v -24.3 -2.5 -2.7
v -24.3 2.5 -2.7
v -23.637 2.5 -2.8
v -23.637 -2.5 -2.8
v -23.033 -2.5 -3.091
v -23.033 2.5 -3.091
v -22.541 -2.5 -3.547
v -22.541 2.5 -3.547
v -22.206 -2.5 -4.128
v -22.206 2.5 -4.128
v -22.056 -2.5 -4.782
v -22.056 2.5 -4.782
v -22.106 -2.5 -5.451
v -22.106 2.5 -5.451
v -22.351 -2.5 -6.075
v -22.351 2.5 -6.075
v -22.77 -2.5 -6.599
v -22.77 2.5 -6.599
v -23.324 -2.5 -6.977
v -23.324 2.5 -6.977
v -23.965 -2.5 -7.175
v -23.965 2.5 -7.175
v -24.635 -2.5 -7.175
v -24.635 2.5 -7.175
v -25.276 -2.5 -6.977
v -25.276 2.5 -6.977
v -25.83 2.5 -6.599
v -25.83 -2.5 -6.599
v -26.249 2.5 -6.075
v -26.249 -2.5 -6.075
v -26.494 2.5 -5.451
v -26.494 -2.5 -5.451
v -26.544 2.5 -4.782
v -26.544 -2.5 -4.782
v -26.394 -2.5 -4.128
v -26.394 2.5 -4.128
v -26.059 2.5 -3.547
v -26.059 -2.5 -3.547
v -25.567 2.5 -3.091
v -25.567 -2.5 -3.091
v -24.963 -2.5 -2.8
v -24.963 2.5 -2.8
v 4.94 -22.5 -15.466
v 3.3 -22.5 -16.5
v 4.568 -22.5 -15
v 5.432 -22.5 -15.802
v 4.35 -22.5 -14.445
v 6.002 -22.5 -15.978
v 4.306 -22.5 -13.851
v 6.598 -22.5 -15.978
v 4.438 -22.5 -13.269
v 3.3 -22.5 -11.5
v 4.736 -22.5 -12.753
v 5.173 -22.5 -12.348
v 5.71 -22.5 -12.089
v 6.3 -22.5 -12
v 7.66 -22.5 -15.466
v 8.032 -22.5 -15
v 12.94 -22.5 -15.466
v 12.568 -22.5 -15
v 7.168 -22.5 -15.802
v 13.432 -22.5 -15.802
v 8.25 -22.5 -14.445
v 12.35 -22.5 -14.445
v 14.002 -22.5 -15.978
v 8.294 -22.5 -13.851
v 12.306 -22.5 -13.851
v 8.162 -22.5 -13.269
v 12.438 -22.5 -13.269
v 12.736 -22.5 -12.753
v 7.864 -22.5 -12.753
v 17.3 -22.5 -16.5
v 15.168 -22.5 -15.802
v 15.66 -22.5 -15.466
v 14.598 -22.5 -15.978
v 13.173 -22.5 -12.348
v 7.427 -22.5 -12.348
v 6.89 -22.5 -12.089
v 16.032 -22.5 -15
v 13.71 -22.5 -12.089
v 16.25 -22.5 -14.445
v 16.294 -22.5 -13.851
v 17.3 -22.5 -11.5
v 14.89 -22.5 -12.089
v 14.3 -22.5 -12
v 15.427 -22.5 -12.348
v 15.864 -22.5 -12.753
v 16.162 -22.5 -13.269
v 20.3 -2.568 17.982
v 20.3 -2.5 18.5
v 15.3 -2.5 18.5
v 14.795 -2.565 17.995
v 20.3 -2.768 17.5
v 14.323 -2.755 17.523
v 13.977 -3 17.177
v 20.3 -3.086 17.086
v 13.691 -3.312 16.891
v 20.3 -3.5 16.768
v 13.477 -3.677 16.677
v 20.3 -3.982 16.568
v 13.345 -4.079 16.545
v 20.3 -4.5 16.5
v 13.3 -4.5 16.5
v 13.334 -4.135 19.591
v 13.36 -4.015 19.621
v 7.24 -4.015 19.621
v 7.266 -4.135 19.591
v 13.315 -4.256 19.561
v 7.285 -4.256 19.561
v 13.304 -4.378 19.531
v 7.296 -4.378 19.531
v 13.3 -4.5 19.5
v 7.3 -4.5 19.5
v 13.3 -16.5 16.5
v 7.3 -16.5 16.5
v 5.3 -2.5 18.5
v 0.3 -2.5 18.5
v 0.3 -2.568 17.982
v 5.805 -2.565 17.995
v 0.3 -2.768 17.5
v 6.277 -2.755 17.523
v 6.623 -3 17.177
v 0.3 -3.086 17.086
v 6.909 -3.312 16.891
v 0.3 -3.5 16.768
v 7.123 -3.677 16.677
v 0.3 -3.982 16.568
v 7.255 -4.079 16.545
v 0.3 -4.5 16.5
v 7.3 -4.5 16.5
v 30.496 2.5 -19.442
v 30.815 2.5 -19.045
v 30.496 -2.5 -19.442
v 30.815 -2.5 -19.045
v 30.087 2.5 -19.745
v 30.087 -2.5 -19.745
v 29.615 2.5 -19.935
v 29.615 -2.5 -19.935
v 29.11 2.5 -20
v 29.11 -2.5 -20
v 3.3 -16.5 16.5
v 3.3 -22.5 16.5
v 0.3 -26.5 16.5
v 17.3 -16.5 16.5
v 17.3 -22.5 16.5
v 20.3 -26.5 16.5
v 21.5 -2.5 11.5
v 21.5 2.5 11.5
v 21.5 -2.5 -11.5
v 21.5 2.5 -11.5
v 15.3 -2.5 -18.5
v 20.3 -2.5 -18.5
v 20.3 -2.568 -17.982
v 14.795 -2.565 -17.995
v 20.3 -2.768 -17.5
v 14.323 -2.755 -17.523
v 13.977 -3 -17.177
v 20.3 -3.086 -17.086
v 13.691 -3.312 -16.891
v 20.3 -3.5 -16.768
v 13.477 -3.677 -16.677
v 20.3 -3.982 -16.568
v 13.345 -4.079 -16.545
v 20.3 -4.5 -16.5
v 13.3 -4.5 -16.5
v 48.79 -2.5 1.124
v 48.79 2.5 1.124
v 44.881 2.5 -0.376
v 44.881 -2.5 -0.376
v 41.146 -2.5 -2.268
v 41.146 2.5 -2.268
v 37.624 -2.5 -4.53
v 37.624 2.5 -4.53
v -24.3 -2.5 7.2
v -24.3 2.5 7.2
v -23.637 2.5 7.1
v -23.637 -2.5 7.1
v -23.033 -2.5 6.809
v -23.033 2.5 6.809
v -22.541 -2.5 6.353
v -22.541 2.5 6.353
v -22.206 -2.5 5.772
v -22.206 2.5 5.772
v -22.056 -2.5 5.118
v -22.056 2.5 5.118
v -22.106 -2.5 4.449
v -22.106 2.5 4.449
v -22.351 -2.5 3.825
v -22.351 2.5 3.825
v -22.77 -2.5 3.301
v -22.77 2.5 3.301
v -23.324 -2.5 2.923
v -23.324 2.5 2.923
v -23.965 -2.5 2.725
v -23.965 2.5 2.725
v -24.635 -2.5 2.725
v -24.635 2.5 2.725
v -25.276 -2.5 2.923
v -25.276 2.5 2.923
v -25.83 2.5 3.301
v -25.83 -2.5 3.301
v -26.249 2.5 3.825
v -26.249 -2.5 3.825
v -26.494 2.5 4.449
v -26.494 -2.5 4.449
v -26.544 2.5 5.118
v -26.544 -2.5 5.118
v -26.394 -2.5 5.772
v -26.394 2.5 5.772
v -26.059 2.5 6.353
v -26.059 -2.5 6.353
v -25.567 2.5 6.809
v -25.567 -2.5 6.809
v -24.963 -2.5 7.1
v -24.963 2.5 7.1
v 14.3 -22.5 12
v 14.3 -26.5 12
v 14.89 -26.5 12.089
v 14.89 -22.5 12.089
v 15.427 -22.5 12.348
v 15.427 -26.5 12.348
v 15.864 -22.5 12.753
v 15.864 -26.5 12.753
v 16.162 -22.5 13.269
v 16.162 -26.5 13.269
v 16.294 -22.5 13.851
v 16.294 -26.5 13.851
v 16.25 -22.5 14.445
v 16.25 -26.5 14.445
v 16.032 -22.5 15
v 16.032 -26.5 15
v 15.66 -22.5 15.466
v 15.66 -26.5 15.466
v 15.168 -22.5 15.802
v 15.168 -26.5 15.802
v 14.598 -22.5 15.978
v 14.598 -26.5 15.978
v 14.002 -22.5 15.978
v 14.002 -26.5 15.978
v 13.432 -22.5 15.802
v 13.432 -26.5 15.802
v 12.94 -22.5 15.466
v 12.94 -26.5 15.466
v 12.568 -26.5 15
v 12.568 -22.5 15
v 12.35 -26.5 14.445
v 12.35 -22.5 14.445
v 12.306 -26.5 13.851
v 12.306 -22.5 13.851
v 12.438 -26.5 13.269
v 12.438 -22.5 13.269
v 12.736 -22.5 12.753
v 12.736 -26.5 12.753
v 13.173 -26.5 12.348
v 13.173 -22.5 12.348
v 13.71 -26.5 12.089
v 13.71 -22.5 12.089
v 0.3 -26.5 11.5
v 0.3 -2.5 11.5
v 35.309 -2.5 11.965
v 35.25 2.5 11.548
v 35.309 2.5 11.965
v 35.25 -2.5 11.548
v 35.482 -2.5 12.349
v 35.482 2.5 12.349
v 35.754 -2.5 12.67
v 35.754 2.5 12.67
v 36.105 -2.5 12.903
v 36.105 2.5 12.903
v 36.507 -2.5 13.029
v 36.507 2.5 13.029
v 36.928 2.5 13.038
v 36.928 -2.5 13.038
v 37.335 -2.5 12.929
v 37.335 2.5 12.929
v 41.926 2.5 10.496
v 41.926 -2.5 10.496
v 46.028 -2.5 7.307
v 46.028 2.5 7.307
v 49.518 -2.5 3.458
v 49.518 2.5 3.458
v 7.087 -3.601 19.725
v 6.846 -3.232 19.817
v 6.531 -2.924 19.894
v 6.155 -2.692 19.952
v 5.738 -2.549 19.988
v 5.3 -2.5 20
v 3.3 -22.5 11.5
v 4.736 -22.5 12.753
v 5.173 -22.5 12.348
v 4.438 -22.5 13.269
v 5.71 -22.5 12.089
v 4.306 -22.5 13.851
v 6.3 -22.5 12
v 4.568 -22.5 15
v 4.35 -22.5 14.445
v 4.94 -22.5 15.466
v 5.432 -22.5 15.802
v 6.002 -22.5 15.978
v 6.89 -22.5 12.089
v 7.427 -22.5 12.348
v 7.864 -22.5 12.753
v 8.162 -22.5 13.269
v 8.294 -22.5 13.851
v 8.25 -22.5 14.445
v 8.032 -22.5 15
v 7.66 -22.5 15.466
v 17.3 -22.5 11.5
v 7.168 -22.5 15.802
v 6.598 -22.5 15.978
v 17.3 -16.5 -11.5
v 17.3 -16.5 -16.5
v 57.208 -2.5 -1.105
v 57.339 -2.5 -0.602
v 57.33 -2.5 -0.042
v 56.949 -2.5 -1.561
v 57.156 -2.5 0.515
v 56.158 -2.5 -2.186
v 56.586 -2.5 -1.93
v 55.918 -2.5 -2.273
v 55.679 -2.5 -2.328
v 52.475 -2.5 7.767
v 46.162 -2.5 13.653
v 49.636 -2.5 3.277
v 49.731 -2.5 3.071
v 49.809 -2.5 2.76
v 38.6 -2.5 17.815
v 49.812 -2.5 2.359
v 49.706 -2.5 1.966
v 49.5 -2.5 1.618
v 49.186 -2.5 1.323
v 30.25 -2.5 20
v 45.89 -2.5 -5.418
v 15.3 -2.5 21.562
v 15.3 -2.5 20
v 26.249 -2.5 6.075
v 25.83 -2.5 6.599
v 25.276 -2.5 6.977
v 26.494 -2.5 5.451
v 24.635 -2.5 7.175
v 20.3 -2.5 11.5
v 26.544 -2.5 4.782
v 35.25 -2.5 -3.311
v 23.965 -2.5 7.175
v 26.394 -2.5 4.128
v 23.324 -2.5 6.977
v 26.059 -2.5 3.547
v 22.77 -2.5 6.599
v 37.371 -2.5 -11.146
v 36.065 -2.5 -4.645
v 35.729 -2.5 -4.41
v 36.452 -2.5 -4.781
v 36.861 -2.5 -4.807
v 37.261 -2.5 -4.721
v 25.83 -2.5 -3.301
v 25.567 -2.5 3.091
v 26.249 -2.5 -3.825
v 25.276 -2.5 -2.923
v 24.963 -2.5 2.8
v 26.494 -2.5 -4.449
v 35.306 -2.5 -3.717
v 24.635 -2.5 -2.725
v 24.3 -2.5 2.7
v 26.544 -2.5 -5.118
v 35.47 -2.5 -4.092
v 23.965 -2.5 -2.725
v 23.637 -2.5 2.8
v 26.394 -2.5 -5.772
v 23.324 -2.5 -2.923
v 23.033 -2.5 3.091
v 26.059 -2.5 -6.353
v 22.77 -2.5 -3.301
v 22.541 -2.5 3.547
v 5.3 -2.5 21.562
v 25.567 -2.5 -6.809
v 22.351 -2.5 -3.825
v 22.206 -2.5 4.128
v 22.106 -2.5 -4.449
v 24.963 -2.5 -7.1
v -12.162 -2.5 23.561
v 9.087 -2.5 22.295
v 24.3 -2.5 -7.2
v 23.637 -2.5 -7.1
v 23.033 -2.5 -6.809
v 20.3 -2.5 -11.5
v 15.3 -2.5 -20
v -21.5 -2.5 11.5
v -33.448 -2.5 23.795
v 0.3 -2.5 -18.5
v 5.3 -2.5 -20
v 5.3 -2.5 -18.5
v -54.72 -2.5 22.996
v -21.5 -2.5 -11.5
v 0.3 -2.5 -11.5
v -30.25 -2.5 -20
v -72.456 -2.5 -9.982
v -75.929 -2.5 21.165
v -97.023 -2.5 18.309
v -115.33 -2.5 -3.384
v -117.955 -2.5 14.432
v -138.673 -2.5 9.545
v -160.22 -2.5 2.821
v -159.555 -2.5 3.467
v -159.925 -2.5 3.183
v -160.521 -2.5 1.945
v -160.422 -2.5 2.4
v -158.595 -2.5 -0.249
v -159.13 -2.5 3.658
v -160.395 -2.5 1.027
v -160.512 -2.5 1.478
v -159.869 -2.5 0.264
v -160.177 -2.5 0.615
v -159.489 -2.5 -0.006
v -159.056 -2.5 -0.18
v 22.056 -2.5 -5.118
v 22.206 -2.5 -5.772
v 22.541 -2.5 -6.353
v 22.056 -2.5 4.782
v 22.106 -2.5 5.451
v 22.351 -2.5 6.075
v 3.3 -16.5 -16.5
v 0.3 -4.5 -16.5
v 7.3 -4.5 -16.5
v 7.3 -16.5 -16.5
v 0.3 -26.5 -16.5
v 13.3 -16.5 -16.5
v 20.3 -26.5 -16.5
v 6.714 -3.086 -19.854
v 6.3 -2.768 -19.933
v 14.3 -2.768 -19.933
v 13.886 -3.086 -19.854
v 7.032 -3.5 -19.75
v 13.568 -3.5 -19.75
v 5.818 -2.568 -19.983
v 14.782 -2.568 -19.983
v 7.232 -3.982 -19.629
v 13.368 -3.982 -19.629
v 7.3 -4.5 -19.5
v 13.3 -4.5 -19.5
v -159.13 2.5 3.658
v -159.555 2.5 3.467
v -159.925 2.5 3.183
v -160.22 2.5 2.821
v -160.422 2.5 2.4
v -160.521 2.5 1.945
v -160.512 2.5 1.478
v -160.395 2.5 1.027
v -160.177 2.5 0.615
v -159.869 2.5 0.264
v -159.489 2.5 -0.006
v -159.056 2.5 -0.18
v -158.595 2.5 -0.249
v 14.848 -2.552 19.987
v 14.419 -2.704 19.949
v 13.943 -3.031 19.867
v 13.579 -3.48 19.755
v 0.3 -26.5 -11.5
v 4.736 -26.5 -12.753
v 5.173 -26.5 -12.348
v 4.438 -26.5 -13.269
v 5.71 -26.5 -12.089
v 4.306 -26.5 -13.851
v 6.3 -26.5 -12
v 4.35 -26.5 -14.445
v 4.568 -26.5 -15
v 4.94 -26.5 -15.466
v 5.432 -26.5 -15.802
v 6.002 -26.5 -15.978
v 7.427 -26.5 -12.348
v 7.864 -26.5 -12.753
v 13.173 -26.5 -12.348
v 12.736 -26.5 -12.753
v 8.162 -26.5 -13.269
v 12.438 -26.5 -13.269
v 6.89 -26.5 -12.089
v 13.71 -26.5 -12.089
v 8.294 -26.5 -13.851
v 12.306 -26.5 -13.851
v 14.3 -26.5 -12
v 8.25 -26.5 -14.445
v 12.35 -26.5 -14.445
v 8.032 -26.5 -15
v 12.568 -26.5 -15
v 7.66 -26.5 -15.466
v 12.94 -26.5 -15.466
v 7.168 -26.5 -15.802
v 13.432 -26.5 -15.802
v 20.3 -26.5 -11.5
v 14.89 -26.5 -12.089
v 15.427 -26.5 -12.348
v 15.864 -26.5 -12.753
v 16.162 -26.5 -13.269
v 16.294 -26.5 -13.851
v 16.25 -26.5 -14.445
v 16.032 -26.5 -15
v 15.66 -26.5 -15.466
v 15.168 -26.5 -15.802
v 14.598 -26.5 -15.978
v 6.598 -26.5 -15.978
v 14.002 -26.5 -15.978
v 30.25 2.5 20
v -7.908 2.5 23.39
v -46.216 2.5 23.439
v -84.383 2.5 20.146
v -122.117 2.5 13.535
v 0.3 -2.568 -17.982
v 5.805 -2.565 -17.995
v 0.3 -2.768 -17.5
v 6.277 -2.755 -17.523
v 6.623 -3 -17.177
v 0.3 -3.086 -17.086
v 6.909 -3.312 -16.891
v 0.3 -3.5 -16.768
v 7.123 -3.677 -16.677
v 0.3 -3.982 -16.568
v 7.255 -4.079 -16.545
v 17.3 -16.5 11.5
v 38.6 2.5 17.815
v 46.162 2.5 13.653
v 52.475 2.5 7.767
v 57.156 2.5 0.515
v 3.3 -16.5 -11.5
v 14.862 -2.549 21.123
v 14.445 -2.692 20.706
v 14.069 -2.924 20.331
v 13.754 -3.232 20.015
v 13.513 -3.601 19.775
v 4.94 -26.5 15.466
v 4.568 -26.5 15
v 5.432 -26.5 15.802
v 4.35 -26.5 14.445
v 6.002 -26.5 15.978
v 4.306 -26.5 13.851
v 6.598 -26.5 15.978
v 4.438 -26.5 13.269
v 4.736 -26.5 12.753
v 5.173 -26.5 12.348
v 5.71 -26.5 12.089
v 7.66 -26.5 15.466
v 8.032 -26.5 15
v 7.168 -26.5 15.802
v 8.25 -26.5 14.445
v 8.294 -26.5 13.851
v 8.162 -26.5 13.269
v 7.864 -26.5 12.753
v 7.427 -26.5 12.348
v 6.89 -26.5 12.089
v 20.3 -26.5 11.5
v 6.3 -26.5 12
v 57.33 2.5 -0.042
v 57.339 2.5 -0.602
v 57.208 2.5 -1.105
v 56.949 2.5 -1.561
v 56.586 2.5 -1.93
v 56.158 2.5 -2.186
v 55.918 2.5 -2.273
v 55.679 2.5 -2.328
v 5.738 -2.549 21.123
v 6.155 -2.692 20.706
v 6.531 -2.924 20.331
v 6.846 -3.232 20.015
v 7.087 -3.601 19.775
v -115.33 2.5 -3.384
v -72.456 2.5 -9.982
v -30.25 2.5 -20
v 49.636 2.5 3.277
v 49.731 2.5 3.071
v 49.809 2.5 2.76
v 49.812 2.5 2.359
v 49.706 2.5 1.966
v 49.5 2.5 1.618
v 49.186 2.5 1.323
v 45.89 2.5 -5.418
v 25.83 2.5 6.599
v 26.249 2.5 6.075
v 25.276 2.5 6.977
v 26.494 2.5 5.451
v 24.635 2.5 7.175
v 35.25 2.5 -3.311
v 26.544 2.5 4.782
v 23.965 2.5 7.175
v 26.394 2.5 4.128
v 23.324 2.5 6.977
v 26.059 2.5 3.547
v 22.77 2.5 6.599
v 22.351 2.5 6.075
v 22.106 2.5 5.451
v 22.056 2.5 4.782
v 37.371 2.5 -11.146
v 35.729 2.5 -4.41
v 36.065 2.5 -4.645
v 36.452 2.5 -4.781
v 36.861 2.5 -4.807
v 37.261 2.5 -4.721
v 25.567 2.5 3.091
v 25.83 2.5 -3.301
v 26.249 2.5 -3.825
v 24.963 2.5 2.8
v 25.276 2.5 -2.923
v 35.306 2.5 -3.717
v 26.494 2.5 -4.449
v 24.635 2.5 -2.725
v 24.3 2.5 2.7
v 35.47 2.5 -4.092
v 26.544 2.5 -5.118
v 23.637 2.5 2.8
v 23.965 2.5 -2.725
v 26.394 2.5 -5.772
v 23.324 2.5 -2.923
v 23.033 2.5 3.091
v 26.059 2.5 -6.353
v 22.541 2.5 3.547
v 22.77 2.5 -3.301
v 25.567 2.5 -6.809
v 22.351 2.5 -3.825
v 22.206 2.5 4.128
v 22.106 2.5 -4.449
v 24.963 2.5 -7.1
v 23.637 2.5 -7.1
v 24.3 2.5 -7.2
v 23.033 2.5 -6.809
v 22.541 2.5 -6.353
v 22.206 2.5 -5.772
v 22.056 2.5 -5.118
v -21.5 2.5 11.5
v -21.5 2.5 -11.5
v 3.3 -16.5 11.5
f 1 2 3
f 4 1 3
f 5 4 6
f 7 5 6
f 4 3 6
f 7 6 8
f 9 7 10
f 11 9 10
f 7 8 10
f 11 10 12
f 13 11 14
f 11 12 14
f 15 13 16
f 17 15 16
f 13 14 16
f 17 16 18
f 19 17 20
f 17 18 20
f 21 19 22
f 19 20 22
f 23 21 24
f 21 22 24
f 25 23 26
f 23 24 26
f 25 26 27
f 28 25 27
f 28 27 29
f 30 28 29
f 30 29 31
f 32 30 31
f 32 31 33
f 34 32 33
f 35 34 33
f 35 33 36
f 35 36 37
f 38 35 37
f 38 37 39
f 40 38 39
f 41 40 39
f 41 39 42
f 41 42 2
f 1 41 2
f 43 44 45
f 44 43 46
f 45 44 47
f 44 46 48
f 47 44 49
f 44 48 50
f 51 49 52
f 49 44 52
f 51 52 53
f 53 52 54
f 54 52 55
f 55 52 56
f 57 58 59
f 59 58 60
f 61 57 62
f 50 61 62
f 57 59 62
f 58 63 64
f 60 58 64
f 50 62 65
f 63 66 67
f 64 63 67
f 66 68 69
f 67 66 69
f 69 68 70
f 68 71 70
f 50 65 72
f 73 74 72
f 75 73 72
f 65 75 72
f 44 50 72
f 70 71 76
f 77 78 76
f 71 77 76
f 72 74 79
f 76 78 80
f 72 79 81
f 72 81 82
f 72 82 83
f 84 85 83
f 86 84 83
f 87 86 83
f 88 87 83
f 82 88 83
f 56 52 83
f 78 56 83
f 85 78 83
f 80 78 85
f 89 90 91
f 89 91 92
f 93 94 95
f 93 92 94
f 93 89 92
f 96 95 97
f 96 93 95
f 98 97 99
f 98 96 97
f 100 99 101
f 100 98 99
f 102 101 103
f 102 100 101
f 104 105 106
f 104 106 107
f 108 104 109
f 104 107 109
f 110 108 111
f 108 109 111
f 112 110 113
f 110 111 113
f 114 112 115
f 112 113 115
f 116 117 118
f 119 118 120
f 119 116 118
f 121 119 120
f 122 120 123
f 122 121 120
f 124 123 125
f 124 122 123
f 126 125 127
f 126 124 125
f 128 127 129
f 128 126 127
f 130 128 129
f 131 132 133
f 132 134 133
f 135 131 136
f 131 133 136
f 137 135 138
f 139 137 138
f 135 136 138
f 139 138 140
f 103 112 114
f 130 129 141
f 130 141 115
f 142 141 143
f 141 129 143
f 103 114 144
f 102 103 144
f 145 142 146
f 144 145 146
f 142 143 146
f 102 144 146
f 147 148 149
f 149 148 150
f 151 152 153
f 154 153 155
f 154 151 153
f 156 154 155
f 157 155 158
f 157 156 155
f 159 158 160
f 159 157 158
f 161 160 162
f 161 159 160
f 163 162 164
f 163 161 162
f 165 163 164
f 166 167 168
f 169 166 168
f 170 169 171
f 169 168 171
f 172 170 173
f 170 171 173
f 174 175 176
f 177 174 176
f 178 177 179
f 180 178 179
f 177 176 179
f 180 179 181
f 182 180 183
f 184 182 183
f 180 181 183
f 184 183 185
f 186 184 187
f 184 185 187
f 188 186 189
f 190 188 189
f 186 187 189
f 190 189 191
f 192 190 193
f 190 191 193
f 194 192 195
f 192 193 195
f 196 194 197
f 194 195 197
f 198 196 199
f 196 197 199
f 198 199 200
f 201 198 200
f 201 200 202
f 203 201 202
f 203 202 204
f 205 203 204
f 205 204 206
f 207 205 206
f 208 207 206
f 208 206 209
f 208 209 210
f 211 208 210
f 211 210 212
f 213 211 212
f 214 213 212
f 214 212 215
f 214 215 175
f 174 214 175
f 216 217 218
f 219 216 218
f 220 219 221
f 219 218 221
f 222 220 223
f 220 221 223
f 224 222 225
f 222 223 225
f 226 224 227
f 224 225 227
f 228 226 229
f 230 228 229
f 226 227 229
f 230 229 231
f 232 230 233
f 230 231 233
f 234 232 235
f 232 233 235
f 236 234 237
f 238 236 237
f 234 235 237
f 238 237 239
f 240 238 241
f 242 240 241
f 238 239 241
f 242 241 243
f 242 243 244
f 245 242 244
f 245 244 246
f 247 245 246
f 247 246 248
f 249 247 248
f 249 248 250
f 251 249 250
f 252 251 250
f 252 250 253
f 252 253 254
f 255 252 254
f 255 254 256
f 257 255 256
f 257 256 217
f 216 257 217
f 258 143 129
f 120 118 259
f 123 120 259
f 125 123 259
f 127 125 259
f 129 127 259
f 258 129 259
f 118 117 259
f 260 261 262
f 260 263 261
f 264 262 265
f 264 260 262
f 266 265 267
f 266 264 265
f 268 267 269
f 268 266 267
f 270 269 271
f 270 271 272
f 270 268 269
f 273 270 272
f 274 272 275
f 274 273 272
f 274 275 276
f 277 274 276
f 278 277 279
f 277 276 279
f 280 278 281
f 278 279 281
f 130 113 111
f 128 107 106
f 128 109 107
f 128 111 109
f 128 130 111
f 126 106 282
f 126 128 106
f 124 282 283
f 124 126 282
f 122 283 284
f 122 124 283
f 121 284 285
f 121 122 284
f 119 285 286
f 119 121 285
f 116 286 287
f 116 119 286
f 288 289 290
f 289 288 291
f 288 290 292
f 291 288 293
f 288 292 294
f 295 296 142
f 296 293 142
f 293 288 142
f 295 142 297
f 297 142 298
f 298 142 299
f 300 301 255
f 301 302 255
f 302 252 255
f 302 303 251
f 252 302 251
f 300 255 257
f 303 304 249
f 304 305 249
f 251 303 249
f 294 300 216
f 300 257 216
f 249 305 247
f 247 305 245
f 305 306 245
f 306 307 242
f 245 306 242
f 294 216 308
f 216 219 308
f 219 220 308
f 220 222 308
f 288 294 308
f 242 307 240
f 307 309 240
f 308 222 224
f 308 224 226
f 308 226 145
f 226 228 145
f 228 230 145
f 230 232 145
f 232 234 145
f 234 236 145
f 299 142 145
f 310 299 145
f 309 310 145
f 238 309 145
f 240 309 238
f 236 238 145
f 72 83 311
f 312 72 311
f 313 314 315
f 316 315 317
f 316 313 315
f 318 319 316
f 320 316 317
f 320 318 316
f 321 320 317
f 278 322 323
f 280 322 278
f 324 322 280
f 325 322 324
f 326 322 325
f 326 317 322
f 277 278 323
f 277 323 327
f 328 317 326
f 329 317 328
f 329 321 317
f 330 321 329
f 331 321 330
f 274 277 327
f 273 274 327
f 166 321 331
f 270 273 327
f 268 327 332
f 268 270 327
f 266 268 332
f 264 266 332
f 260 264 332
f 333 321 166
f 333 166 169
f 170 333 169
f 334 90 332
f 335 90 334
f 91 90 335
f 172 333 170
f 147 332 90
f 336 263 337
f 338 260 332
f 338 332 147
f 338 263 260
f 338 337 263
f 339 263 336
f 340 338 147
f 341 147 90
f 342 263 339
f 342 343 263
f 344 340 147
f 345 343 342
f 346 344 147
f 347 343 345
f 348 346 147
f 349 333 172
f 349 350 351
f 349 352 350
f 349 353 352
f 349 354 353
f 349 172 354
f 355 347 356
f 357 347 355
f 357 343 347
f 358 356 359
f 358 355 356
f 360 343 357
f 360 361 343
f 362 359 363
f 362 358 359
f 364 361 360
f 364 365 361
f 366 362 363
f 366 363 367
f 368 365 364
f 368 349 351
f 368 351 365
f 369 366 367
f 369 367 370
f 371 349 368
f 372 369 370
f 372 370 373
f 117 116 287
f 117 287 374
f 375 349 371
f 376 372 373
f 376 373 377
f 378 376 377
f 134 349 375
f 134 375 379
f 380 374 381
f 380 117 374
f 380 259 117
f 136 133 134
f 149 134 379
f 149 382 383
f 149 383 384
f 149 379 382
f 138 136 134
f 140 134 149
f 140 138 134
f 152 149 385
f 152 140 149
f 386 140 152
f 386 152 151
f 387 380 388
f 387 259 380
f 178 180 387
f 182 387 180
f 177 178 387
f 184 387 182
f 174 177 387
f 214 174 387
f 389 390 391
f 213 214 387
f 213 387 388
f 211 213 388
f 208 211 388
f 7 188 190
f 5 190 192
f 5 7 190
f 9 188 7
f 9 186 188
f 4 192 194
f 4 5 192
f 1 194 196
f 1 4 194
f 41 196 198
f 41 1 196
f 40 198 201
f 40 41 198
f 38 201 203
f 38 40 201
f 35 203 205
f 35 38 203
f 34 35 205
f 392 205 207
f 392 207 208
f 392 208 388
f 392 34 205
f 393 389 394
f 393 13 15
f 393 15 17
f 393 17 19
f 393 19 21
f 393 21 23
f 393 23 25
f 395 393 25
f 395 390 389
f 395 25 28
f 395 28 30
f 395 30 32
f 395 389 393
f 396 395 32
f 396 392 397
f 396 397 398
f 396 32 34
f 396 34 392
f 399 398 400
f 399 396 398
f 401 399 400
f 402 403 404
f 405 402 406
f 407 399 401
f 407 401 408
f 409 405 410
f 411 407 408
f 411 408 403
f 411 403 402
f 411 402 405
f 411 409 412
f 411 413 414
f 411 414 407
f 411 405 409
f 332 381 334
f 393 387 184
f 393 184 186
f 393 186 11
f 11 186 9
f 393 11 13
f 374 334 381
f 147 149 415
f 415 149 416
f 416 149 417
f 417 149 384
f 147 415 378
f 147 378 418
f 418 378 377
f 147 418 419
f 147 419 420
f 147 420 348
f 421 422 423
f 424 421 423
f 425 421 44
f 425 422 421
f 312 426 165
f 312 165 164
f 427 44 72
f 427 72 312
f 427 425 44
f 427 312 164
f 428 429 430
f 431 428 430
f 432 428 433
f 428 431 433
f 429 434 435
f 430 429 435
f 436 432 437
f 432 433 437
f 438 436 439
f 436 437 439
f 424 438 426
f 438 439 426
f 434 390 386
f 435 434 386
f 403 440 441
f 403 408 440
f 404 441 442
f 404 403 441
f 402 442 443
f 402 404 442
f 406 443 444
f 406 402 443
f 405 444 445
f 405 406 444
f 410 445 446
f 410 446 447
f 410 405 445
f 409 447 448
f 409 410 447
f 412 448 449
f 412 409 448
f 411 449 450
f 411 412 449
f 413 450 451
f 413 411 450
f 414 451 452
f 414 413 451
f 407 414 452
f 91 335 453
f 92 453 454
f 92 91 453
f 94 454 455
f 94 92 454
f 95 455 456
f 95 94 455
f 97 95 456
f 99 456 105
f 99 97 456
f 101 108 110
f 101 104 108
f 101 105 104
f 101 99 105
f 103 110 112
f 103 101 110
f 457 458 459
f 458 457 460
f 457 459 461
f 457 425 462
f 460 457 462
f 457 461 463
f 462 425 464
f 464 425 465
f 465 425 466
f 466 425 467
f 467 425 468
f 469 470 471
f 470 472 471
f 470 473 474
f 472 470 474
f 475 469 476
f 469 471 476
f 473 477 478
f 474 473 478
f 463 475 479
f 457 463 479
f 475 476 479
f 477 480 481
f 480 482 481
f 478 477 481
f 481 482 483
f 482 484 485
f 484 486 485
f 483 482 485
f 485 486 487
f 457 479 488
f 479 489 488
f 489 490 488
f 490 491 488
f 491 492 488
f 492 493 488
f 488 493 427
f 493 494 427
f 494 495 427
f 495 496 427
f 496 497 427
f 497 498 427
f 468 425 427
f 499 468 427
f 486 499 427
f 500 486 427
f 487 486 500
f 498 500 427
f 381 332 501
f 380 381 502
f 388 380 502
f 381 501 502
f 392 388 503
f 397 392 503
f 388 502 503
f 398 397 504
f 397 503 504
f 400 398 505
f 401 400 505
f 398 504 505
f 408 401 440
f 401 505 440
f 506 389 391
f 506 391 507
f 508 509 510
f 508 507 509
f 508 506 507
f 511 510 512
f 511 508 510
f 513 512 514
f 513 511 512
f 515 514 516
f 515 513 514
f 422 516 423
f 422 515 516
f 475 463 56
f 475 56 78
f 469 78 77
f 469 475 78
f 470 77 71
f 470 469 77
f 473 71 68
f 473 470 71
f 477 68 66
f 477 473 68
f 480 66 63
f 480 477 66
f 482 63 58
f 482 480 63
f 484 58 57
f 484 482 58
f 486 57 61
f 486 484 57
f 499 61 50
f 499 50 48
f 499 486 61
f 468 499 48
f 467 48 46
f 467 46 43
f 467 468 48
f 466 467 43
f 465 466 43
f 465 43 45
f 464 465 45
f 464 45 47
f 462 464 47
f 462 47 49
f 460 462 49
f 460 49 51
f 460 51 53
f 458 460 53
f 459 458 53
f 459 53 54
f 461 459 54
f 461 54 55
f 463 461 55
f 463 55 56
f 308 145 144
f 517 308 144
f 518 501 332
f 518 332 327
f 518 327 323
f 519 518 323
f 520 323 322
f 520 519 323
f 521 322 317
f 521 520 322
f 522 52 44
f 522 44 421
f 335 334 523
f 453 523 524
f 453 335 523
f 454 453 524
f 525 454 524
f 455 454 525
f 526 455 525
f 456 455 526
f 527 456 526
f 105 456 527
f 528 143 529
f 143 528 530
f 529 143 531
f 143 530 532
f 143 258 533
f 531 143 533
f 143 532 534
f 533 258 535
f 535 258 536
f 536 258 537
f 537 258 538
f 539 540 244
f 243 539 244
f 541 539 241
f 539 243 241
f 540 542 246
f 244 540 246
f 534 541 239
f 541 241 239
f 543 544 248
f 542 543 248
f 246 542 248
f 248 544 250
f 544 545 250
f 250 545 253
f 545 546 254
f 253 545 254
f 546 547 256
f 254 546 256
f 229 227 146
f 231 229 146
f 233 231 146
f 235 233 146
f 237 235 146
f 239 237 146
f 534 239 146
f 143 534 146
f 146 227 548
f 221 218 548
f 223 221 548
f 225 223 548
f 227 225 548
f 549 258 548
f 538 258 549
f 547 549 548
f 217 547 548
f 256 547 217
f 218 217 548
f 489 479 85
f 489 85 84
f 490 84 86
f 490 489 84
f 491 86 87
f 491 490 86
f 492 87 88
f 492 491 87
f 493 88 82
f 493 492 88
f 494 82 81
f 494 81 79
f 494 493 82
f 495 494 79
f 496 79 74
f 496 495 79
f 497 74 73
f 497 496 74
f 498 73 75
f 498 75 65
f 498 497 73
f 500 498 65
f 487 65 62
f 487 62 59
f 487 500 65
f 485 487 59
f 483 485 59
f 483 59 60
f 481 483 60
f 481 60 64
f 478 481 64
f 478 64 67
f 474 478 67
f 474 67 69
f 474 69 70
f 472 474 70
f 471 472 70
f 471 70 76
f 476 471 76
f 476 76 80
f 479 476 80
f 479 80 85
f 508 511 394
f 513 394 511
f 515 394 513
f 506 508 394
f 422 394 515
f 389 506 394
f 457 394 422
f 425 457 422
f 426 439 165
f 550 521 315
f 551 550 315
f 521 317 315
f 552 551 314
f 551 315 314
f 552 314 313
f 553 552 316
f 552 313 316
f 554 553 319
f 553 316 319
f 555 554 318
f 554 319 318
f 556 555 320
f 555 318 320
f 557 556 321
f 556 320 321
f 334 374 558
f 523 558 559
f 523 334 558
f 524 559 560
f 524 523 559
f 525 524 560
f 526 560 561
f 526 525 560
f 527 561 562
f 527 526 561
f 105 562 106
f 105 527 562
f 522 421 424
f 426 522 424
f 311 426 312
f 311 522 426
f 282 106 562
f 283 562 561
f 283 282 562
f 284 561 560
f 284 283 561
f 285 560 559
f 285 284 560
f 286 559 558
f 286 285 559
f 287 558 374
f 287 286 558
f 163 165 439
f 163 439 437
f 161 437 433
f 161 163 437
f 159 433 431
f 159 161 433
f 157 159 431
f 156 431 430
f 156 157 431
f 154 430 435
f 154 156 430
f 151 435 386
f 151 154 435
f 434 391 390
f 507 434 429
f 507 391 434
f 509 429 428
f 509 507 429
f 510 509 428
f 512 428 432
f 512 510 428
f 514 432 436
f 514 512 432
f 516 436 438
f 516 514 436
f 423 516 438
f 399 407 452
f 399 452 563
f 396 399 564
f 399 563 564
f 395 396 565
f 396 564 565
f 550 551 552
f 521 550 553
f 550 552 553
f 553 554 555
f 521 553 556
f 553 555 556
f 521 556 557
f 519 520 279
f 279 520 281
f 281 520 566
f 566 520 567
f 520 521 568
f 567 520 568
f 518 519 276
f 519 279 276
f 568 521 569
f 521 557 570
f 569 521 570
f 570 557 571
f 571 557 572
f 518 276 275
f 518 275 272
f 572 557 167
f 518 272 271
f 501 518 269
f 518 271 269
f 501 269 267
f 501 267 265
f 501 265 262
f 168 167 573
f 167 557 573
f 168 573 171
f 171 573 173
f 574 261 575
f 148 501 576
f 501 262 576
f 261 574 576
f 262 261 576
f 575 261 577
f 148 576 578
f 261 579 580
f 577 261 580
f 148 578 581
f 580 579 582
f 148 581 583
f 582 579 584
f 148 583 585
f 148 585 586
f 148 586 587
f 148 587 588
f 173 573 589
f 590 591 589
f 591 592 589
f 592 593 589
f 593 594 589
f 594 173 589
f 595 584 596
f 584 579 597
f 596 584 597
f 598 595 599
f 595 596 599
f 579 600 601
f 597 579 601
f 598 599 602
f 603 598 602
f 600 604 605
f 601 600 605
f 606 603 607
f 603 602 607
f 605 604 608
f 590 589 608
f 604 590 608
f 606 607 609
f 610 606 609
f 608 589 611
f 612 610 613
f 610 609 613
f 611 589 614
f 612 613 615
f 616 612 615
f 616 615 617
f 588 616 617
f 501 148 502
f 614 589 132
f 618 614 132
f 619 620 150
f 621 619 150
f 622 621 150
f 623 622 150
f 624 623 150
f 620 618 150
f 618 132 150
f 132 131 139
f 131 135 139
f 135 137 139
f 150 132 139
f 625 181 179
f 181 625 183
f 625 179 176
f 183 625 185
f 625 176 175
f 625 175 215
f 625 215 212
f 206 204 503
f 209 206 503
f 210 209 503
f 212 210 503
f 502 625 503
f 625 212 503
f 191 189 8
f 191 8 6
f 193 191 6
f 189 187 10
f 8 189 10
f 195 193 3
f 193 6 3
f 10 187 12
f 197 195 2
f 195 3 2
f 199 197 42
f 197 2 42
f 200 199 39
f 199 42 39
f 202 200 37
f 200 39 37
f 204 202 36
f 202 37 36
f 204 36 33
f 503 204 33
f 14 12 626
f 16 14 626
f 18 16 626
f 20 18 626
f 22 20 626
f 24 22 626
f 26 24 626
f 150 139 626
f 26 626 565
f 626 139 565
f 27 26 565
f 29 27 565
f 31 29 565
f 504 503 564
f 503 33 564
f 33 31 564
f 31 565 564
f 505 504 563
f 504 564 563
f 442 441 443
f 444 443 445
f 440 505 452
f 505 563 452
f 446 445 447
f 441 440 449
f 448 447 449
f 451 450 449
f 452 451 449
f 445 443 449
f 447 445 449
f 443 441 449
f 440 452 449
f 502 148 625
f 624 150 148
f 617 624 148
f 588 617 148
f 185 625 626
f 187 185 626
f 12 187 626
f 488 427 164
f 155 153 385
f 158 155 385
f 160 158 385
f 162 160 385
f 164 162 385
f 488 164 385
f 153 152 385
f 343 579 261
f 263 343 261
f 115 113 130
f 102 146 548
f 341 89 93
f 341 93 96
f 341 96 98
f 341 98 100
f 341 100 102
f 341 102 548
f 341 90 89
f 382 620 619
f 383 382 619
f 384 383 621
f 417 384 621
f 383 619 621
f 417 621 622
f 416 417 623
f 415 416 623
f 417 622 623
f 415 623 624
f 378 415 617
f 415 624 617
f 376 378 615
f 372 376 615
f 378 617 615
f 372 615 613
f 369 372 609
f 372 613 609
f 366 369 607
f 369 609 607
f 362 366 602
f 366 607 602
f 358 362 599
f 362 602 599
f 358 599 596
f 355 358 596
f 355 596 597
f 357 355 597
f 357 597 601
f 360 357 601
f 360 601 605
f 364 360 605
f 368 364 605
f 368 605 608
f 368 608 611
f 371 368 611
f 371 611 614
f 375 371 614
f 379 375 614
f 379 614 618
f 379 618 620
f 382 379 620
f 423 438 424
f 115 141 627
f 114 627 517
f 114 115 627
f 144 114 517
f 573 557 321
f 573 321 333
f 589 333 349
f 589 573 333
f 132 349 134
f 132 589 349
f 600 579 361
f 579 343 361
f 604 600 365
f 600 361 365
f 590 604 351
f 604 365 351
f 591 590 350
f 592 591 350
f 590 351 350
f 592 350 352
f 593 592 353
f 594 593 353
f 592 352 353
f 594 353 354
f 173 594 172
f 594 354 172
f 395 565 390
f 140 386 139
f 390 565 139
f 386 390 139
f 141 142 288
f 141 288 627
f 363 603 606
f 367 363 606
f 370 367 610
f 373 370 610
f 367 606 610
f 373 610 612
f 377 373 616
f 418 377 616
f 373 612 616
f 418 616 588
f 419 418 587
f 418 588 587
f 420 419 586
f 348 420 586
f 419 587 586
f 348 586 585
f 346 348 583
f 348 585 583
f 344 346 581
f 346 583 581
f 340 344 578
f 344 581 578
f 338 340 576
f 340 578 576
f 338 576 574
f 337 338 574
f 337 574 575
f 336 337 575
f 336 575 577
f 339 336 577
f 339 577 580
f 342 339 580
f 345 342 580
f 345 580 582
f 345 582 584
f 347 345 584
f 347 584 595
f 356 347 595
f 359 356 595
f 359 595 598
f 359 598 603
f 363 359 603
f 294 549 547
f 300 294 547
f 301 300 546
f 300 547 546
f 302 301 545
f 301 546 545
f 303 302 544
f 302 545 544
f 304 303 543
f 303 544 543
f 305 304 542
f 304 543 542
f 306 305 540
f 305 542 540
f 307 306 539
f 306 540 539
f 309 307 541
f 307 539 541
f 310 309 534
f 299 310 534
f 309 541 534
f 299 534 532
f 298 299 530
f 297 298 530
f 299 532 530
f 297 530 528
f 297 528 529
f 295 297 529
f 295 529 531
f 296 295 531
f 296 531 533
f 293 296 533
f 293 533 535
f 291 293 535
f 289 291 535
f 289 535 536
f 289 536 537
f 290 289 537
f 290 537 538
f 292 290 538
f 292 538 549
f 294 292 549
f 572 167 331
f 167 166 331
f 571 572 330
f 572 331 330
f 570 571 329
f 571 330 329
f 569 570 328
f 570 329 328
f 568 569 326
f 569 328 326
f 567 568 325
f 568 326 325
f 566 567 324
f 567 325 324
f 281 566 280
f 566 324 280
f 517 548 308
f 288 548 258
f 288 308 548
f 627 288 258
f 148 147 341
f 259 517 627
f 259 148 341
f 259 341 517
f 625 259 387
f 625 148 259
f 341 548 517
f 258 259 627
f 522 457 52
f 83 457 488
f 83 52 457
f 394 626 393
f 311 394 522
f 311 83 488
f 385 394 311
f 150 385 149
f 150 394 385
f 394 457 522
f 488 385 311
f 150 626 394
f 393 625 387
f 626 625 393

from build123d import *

# Parameters (mm, degrees)
SKETCH1_W           = 60.5
SKETCH1_H           = 40
SKETCH1_W_2         = 43
SKETCH1_H_2         = 23
BOSS_EXTRUDE1_DEPTH = 2.5
BOSS_EXTRUDE2_DEPTH = 5
BOSS_EXTRUDE3_DEPTH = 5
SKETCH4_R           = 2.25
CUT_EXTRUDE1_DEPTH  = 172.982842356
BOSS_EXTRUDE4_START = -29
SKETCH6_W           = 20
SKETCH6_H           = 5
BOSS_EXTRUDE4_DEPTH = 24
SKETCH7_W           = 14
SKETCH7_H           = 6
CUT_EXTRUDE3_DEPTH  = 177.123713622
FILLET1_R           = 2
FILLET2_R           = 2
FILLET3_R           = 1.5
CUT_EXTRUDE4_REACH  = 166.861
SKETCH8_R           = 2
BOSS_EXTRUDE5_DEPTH = 3
FILLET4_R           = 2


with BuildPart() as part:
    # Sketch1 → Boss-Extrude1 (new, symmetric)
    with BuildSketch(Plane(origin=(0, 0, 0), x_dir=(1, 0, 0), z_dir=(0, 1, 0))):
        Rectangle(SKETCH1_W, SKETCH1_H)
        Rectangle(SKETCH1_W_2, SKETCH1_H_2, mode=Mode.SUBTRACT)
    extrude(amount=BOSS_EXTRUDE1_DEPTH, both=True)

    # Sketch2 → Boss-Extrude2 (add)
    with BuildSketch(Plane(origin=(0, 2.5, 0), x_dir=(1, 0, 0), z_dir=(0, 1, 0))):
        with BuildLine():
            Line((30.25, 20), (30.25, -20))
            ThreePointArc((30.25, -20), (47.256913802, -12.826981202), (58.25, 2))
            ThreePointArc((58.25, 2), (42.044671251, 7.569488613), (30.25, 20))
        make_face()
        with BuildLine():
            Line((35.25, 6.366833624), (35.25, -13.722672005))
            ThreePointArc((35.25, -13.722672005), (44.009484688, -9.018930074), (50.750559549, -1.710601274))
            ThreePointArc((50.750559549, -1.710601274), (42.564834707, 1.49249914), (35.25, 6.366833624))
        make_face(mode=Mode.SUBTRACT)
    extrude(amount=-BOSS_EXTRUDE2_DEPTH)

    # Sketch3 → Boss-Extrude3 (add)
    with BuildSketch(Plane(origin=(0, 2.5, 0), x_dir=(1, 0, 0), z_dir=(0, 1, 0))):
        with BuildLine():
            Line((-30.25, 20), (-30.25, -20))
            Line((-30.25, -20), (30.25, -20))
            ThreePointArc((30.25, -20), (-71.163797142, -21.66706635), (-170.25, 0))
            ThreePointArc((-170.25, 0), (-99.592440555, 5.397083884), (-30.25, 20))
        make_face()
    extrude(amount=-BOSS_EXTRUDE3_DEPTH)

    # Sketch4 → Cut-Extrude1 (cut, through all)
    with BuildSketch(Plane(origin=(0, 2.5, 0), x_dir=(1, 0, 0), z_dir=(0, 1, 0))):
        with Locations(Location((-24.3, 4.95, 0), (0, 0, 270))):
            Circle(SKETCH4_R)
        with Locations(Location((-24.3, -4.95, 0), (0, 0, 270))):
            Circle(SKETCH4_R)
        with Locations(Location((24.3, -4.95, 0), (0, 0, 90))):
            Circle(SKETCH4_R)
        with Locations(Location((24.3, 4.95, 0), (0, 0, 90))):
            Circle(SKETCH4_R)
    extrude(amount=-CUT_EXTRUDE1_DEPTH, mode=Mode.SUBTRACT)

    # Sketch6 → Boss-Extrude4 (add)
    with BuildSketch(Plane(origin=(0, 2.5, 0), x_dir=(1, 0, 0), z_dir=(0, 1, 0)).offset(BOSS_EXTRUDE4_START)):
        with Locations((10.3, 14)):
            Rectangle(SKETCH6_W, SKETCH6_H)
        with Locations((10.3, -14)):
            Rectangle(SKETCH6_W, SKETCH6_H)
    extrude(amount=BOSS_EXTRUDE4_DEPTH)

    # Sketch7 → Cut-Extrude3 (cut, through all)
    with BuildSketch(Plane.XY.offset(16.5)):
        with Locations((10.3, -19.5)):
            Rectangle(SKETCH7_W, SKETCH7_H)
    extrude(amount=-CUT_EXTRUDE3_DEPTH, mode=Mode.SUBTRACT)

    # Fillet1
    fillet1_edges = [part.edges().sort_by_distance(p)[0] for p in [
        (-170.25, 0, 0),
    ]]
    fillet(fillet1_edges, radius=FILLET1_R)

    # Fillet2
    fillet2_edges = [part.edges().sort_by_distance(p)[0] for p in [
        (58.25, 0, -2),
        (30.25, 0, -20),
    ]]
    fillet(fillet2_edges, radius=FILLET2_R)

    # Fillet3
    fillet3_edges = [part.edges().sort_by_distance(p)[0] for p in [
        (35.25, 0, -6.366833624),
        (35.25, 0, 13.722672005),
        (50.750559549, 0, 1.710601274),
    ]]
    fillet(fillet3_edges, radius=FILLET3_R)

    # Sketch8 → Cut-Extrude4 (cut, up to next)
    with BuildSketch(Plane.XZ.offset(26.5), mode=Mode.PRIVATE) as cut_extrude4_sk1:
        with Locations(Location((6.3, 14, 0), (0, 0, 270))):
            Circle(SKETCH8_R)
    cut_extrude4_tool1 = extrude(cut_extrude4_sk1.sketch, amount=-CUT_EXTRUDE4_REACH, mode=Mode.PRIVATE) & part.part
    # Sketch8 → Cut-Extrude4 (cut, up to next)
    with BuildSketch(Plane.XZ.offset(26.5), mode=Mode.PRIVATE) as cut_extrude4_sk2:
        with Locations(Location((14.3, 14, 0), (0, 0, 270))):
            Circle(SKETCH8_R)
    cut_extrude4_tool2 = extrude(cut_extrude4_sk2.sketch, amount=-CUT_EXTRUDE4_REACH, mode=Mode.PRIVATE) & part.part
    cut_extrude4_1 = cut_extrude4_tool1.solids().sort_by_distance((6.3, -26.5, 14))[0]
    add(cut_extrude4_1, mode=Mode.SUBTRACT)
    cut_extrude4_2 = cut_extrude4_tool2.solids().sort_by_distance((14.3, -26.5, 14))[0]
    add(cut_extrude4_2, mode=Mode.SUBTRACT)
    cut_extrude4 = cut_extrude4_1 + cut_extrude4_2  # Cut-Extrude4 as one shape, for the pattern or mirror that repeats it

    # Sketch9 → Boss-Extrude5 (add, symmetric)
    with BuildSketch(Plane(origin=(10.3, 0, 0), x_dir=(0, 0, -1), z_dir=(1, 0, 0))):
        Polygon((-20, -2.5), (-16.5, -16.5), (-16.5, -2.5), align=None)
    boss_extrude5 = extrude(amount=BOSS_EXTRUDE5_DEPTH, both=True)

    # Mirror1: Cut-Extrude4, Boss-Extrude5 across plane
    add(cut_extrude4.mirror(Plane.XY), mode=Mode.SUBTRACT)
    add(boss_extrude5.mirror(Plane.XY))

    # Fillet4
    # the kernel refuses this fillet: 2 mm, written as the material it adds along each edge
    with BuildSketch(Plane(origin=(20.3, -2.5, 16.5), x_dir=(0, 0, 1), z_dir=(-1, 0, 0)), Plane(origin=(0.3, -2.5, -16.5), x_dir=(0, 0, -1), z_dir=(1, 0, 0)), Plane(origin=(8.3, -2.5, -16.5), x_dir=(0, 0, -1), z_dir=(1, 0, 0)), Plane(origin=(12.3, -2.5, 16.5), x_dir=(0, 0, 1), z_dir=(-1, 0, 0))) as fillet4_piece_1:
        with BuildLine():
            CenterArc((FILLET4_R, -FILLET4_R), FILLET4_R, 90, 90)
            Line((0, -FILLET4_R), (0, 0))
            Line((0, 0), (FILLET4_R, 0))
        make_face()
    extrude(amount=12)
    with BuildSketch(Plane(origin=(7.3, -2.5, 11.5), x_dir=(-1, 0, 0), z_dir=(0, 0, 1))) as fillet4_piece_2_section:
        with BuildLine():
            CenterArc((FILLET4_R, FILLET4_R), FILLET4_R, 180, 90)
            Line((0, FILLET4_R), (0, 0))
            Line((0, 0), (FILLET4_R, 0))
        make_face()
    fillet4_piece_2 = extrude(amount=13.5, mode=Mode.PRIVATE)
    fillet4_piece_2 = split(fillet4_piece_2, bisect_by=Plane(origin=(6.847209771, -4.337920215, 19.540519946), z_dir=(0, 0.242535625036333, -0.9701425001453319)), keep=Keep.TOP, mode=Mode.PRIVATE)
    add(fillet4_piece_2)
    with BuildSketch(Plane(origin=(13.3, -2.5, 20), x_dir=(0, 0, 1), z_dir=(-1, 0, 0))) as fillet4_piece_3:
        with BuildLine():
            CenterArc((FILLET4_R * 0.780776406404, -FILLET4_R), FILLET4_R, 90, 75.963756532)
            Line((-FILLET4_R * 0.189366093741, -FILLET4_R * 0.757464374964), (0, 0))
            Line((0, 0), (FILLET4_R * 0.780776406404, 0))
        make_face()
    extrude(amount=6)
    with BuildSketch(Plane(origin=(13.3, -2.5, 11.5), x_dir=(1, 0, 0), z_dir=(0, 0, 1))) as fillet4_piece_4_section:
        with BuildLine():
            CenterArc((FILLET4_R, -FILLET4_R), FILLET4_R, 90, 90)
            Line((0, -FILLET4_R), (0, 0))
            Line((0, 0), (FILLET4_R, 0))
        make_face()
    fillet4_piece_4 = extrude(amount=13.5, mode=Mode.PRIVATE)
    fillet4_piece_4 = split(fillet4_piece_4, bisect_by=Plane(origin=(13.752790229, -4.337920215, 19.540519946), z_dir=(0, 0.242535625036333, -0.9701425001453319)), keep=Keep.TOP, mode=Mode.PRIVATE)
    add(fillet4_piece_4)
    with BuildSketch(Plane(origin=(13.3, -2.5, -11.5), x_dir=(1, 0, 0), z_dir=(0, 0, -1))) as fillet4_piece_5_section:
        with BuildLine():
            CenterArc((FILLET4_R, FILLET4_R), FILLET4_R, 180, 90)
            Line((0, FILLET4_R), (0, 0))
            Line((0, 0), (FILLET4_R, 0))
        make_face()
    fillet4_piece_5 = extrude(amount=8.5, mode=Mode.PRIVATE)
    fillet4_piece_5 = split(fillet4_piece_5, bisect_by=Plane(origin=(13.752790229, -4.337920215, -19.540519946), z_dir=(0, 0.242535625036333, 0.9701425001453319)), keep=Keep.TOP, mode=Mode.PRIVATE)
    add(fillet4_piece_5)
    with BuildSketch(Plane(origin=(7.3, -2.5, -11.5), x_dir=(-1, 0, 0), z_dir=(0, 0, -1))) as fillet4_piece_6_section:
        with BuildLine():
            CenterArc((FILLET4_R, -FILLET4_R), FILLET4_R, 90, 90)
            Line((0, -FILLET4_R), (0, 0))
            Line((0, 0), (FILLET4_R, 0))
        make_face()
    fillet4_piece_6 = extrude(amount=8.5, mode=Mode.PRIVATE)
    fillet4_piece_6 = split(fillet4_piece_6, bisect_by=Plane(origin=(6.847209771, -4.337920215, -19.540519946), z_dir=(0, 0.242535625036333, 0.9701425001453319)), keep=Keep.TOP, mode=Mode.PRIVATE)
    add(fillet4_piece_6)
    with BuildSketch(Plane(origin=(13.3, -2.5, 20), x_dir=(0, 0, 1), z_dir=(-1, 0, 0))) as fillet4_piece_7a_section:
        with BuildLine():
            CenterArc((FILLET4_R * 0.780776406404, -FILLET4_R), FILLET4_R, 90, 75.963756532)
            Line((-FILLET4_R * 0.189366093741, -FILLET4_R * 0.757464374964), (0, 0))
            Line((0, 0), (FILLET4_R * 0.780776406404, 0))
        make_face()
    fillet4_piece_7a = extrude(amount=9.903882032, mode=Mode.PRIVATE)
    fillet4_piece_7a = split(fillet4_piece_7a, bisect_by=Plane(origin=(7.3, -2.834860191, 20.261450936), z_dir=(-1, 0, 0)), keep=Keep.TOP, mode=Mode.PRIVATE)
    with BuildSketch(Plane(origin=(7.3, -2.5, 16.5), x_dir=(-1, 0, 0), z_dir=(0, 0, 1))) as fillet4_piece_7b_section:
        with BuildLine():
            CenterArc((FILLET4_R, FILLET4_R), FILLET4_R, 180, 90)
            Line((0, FILLET4_R), (0, 0))
            Line((0, 0), (FILLET4_R, 0))
        make_face()
    fillet4_piece_7b = extrude(amount=8.5, mode=Mode.PRIVATE)
    fillet4_piece_7b = fillet4_piece_7b & Plane(origin=(-27.619084703, -2.967404811, -414.868675855), x_dir=(0.1319097290212544, 0, 0.9912617330400378), z_dir=(0, 1, 0)) * Cylinder(438.702172555, 25, mode=Mode.PRIVATE)
    fillet4_piece_7b = split(fillet4_piece_7b, bisect_by=Plane(origin=(6.852193926, -2.662257848, 19.959435538), z_dir=(0, -0.242535625036333, 0.9701425001453319)), keep=Keep.TOP, mode=Mode.PRIVATE)
    fillet4_piece_7 = fillet4_piece_7a & fillet4_piece_7b
    add(fillet4_piece_7)
    with BuildSketch(Plane(origin=(13.3, -2.5, 16.5), x_dir=(1, 0, 0), z_dir=(0, 0, 1))) as fillet4_piece_8a_section:
        with BuildLine():
            CenterArc((FILLET4_R, -FILLET4_R), FILLET4_R, 90, 90)
            Line((0, -FILLET4_R), (0, 0))
            Line((0, 0), (FILLET4_R, 0))
        make_face()
    fillet4_piece_8a = extrude(amount=8.5, mode=Mode.PRIVATE)
    fillet4_piece_8a = fillet4_piece_8a & Plane(origin=(-27.619084703, -2.981369523, -414.868675855), x_dir=(0.1319097290212544, 0, 0.9912617330400378), z_dir=(0, 1, 0)) * Cylinder(438.702172555, 25, mode=Mode.PRIVATE)
    fillet4_piece_8a = split(fillet4_piece_8a, bisect_by=Plane(origin=(13.730097047, -2.74600268, 19.93849933), z_dir=(0, -0.242535625036333, 0.9701425001453319)), keep=Keep.TOP, mode=Mode.PRIVATE)
    with BuildSketch(Plane(origin=(17.203882032, -2.5, 20), x_dir=(0, 0, 1), z_dir=(-1, 0, 0))) as fillet4_piece_8b_section:
        with BuildLine():
            CenterArc((FILLET4_R * 0.780776406404, -FILLET4_R), FILLET4_R, 90, 75.963756532)
            Line((-FILLET4_R * 0.189366093741, -FILLET4_R * 0.757464374964), (0, 0))
            Line((0, 0), (FILLET4_R * 0.780776406404, 0))
        make_face()
    fillet4_piece_8b = extrude(amount=9.903882032, mode=Mode.PRIVATE)
    fillet4_piece_8b = fillet4_piece_8b & Plane(origin=(-27.619084703, -2.834877125, -414.868675855), x_dir=(0.1319097290212544, 0, 0.9912617330400378), z_dir=(0, 1, 0)) * Cylinder(438.702172555, 27, mode=Mode.PRIVATE)
    fillet4_piece_8b = split(fillet4_piece_8b, bisect_by=Plane(origin=(13.3, -2.834877125, 20.261389272), z_dir=(1, 0, 0)), keep=Keep.TOP, mode=Mode.PRIVATE)
    fillet4_piece_8 = fillet4_piece_8a & fillet4_piece_8b
    add(fillet4_piece_8)


solid = part.part
